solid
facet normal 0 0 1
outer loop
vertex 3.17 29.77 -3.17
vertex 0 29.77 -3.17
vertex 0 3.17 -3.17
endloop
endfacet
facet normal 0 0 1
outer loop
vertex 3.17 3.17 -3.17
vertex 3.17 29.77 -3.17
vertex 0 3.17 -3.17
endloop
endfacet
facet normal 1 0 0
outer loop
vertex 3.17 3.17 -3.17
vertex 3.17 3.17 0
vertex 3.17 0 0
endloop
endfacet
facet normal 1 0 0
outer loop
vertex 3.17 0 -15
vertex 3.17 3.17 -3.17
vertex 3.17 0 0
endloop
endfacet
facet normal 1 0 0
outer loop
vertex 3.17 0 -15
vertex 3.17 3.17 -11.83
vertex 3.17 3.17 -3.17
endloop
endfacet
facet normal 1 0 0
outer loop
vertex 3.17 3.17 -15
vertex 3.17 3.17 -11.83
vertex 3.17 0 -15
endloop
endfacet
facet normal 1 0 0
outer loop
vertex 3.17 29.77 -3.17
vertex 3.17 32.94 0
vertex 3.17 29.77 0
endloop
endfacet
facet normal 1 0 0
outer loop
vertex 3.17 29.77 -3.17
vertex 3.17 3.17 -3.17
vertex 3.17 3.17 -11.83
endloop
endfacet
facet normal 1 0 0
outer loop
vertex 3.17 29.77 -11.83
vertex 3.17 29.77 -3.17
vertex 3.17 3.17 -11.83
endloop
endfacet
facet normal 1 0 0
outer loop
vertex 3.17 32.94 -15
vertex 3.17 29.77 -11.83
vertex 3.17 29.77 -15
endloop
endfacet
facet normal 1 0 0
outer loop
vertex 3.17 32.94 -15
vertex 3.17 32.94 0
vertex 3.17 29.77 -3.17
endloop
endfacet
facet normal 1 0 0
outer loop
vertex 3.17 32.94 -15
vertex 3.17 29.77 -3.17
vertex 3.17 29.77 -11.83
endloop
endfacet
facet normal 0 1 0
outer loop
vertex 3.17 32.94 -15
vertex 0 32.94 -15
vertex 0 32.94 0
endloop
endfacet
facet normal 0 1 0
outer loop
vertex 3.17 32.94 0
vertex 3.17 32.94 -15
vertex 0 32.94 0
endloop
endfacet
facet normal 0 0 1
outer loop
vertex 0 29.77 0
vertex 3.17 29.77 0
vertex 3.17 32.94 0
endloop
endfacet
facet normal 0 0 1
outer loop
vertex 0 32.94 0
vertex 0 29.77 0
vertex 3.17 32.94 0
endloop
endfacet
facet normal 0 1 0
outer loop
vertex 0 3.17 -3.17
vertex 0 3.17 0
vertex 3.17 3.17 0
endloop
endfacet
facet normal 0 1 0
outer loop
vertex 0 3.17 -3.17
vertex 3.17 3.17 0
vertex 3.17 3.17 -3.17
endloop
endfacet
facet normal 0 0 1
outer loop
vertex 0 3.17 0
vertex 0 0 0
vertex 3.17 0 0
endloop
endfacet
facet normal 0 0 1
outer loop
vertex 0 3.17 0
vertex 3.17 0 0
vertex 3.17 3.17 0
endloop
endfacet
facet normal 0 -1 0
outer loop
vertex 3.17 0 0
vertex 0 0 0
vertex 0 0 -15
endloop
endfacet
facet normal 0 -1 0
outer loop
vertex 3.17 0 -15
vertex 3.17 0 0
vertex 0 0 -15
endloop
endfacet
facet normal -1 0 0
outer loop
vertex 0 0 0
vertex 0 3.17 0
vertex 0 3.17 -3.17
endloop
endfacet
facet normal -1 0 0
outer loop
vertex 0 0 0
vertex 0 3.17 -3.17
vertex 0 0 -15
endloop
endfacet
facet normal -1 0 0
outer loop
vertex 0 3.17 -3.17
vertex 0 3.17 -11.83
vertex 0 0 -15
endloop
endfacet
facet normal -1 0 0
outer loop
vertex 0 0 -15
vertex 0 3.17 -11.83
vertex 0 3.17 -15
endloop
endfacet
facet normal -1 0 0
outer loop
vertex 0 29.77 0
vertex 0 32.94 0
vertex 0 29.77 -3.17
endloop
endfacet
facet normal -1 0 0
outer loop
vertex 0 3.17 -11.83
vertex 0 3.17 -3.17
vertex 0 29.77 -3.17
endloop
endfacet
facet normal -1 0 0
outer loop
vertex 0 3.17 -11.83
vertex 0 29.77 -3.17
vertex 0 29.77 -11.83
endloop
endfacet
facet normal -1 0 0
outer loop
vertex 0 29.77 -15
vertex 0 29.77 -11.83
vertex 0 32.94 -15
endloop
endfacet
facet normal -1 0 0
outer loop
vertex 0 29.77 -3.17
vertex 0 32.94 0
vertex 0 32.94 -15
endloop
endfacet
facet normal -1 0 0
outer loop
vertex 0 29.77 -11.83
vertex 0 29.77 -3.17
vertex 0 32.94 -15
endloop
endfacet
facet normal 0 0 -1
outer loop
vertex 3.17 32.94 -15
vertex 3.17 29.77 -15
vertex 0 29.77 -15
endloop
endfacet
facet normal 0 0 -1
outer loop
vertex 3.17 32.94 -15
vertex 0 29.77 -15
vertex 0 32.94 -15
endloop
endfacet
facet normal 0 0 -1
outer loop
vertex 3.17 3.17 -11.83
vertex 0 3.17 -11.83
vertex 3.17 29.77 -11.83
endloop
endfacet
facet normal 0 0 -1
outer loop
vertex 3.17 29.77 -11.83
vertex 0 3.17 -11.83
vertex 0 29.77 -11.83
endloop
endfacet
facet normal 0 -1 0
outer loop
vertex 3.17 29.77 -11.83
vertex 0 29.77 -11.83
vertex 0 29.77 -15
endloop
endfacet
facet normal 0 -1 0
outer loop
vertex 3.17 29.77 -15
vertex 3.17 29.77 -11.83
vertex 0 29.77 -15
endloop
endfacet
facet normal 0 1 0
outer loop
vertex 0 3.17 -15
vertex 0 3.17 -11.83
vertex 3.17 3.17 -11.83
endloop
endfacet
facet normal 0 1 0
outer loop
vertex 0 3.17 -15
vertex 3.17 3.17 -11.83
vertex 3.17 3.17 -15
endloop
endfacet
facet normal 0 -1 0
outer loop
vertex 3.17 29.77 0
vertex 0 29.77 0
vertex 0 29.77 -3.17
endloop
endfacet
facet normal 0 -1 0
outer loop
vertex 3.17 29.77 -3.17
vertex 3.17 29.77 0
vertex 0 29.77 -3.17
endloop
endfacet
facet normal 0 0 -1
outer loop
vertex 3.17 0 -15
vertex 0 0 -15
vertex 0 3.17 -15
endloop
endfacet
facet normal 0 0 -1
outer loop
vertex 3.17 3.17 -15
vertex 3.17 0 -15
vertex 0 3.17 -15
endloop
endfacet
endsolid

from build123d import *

# Parameters (mm, degrees)
SKETCH1_W           = 3.17
SKETCH1_H           = 3.17
BOSS_EXTRUDE1_DEPTH = 3.17


with BuildPart() as part:
    # Sketch1 → Boss-Extrude1 (new body)
    with BuildSketch(Plane(origin=(0, 0, 0), x_dir=(0, 0, -1), z_dir=(1, 0, 0))):
        with Locations((13.415, 31.355)):
            Rectangle(SKETCH1_W, SKETCH1_H)
        with Locations((1.585, 31.355)):
            Rectangle(SKETCH1_W, SKETCH1_H)
        with Locations((1.585, 1.585)):
            Rectangle(SKETCH1_W, SKETCH1_H)
        with Locations((13.415, 1.585)):
            Rectangle(SKETCH1_W, SKETCH1_H)
        Polygon((11.83, 3.17), (11.83, 29.77), (11.83, 32.94), (3.17, 32.94), (3.17, 29.77), (3.17, 3.17), (3.17, 0), (11.83, 0), align=None)
    extrude(amount=BOSS_EXTRUDE1_DEPTH)


solid = part.part
